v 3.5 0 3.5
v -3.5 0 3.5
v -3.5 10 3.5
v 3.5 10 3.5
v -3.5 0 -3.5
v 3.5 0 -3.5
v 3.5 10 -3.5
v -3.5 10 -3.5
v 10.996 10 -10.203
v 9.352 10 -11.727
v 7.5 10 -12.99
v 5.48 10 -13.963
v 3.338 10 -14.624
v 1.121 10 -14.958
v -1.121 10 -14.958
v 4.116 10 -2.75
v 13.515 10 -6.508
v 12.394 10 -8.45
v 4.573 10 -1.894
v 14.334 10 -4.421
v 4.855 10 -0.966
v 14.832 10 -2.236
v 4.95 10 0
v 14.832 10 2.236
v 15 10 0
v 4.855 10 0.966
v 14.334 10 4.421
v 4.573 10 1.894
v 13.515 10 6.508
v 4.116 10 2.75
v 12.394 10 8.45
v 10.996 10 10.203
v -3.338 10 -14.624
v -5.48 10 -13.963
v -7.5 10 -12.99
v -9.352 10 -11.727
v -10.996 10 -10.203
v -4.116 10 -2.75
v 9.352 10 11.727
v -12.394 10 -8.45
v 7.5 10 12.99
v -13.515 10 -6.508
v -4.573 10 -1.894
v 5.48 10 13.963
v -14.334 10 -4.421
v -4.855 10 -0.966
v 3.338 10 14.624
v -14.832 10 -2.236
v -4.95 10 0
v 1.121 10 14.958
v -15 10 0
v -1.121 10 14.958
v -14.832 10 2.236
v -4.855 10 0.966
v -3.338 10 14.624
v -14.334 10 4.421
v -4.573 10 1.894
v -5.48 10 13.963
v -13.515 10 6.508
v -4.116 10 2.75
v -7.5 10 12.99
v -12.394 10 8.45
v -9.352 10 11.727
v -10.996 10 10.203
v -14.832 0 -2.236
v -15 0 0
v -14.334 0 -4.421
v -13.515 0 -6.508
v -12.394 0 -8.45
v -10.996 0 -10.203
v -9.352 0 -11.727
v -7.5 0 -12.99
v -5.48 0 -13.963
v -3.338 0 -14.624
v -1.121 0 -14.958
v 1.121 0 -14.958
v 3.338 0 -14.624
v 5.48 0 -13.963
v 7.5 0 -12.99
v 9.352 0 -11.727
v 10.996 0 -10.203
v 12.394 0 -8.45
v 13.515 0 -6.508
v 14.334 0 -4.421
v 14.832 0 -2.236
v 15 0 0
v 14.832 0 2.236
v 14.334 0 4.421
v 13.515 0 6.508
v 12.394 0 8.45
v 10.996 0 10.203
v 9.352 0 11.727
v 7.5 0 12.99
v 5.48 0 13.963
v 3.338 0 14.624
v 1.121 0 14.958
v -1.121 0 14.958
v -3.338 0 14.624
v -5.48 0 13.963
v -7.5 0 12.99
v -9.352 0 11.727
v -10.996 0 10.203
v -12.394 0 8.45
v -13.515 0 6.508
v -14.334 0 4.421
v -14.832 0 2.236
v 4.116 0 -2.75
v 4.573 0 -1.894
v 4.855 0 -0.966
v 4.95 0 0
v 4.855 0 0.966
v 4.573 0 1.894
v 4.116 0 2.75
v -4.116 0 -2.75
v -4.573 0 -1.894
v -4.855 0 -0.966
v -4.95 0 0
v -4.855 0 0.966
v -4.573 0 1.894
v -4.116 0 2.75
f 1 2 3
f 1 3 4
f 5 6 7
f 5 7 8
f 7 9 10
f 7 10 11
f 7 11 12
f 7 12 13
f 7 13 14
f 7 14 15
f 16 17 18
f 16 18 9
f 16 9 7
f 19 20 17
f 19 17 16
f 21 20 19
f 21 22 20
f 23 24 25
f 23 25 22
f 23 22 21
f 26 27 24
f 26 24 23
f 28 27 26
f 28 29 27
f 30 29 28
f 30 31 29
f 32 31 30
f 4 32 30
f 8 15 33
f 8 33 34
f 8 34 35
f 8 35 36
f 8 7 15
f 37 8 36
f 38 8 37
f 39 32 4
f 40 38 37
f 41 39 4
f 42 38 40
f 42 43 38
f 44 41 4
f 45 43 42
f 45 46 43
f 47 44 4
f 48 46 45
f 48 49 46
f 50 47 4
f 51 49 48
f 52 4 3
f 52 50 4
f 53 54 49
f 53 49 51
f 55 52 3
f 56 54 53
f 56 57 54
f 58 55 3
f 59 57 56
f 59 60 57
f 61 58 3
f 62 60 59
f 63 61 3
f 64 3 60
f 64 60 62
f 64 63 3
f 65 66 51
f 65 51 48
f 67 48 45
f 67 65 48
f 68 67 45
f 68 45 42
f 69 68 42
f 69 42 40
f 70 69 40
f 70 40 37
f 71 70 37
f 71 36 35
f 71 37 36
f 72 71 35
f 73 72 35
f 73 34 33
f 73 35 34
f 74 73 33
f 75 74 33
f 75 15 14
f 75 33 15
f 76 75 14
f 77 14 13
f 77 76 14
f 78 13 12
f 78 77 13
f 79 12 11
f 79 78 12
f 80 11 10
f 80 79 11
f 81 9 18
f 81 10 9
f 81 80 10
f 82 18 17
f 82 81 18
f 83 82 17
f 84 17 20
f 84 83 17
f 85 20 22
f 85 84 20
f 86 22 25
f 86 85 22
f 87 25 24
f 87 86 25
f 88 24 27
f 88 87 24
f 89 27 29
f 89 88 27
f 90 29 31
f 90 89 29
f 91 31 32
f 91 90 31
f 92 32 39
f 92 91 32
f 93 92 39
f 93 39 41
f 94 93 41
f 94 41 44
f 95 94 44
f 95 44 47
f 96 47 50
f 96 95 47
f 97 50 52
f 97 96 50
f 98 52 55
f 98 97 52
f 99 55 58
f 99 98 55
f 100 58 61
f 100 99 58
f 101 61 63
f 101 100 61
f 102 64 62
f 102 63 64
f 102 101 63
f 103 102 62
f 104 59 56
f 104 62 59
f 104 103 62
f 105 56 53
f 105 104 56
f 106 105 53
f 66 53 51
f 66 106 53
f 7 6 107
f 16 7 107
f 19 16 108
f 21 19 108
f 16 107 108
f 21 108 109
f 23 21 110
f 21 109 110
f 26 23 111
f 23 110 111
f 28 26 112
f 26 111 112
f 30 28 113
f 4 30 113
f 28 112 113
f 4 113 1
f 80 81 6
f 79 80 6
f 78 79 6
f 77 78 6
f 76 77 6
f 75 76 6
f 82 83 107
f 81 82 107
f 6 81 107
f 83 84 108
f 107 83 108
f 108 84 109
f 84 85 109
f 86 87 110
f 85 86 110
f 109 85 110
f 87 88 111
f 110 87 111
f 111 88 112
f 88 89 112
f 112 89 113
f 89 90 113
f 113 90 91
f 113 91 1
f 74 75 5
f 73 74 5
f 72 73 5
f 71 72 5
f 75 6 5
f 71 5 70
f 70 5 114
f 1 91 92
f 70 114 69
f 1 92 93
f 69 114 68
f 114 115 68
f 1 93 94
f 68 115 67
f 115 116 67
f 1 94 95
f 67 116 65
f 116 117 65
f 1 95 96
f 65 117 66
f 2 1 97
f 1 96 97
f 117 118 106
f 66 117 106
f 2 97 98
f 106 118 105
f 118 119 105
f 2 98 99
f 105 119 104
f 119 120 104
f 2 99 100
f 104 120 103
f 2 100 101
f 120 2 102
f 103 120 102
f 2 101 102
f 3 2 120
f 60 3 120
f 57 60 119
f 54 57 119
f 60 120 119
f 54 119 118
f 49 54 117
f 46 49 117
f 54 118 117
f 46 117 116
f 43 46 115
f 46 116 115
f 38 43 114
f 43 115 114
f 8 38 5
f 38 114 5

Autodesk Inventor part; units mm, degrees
ref_plane "YZ Plane" through (0, 0, 0) normal (1, 0, 0) x (0, 1, 0)
ref_plane "XZ Plane" through (0, 0, 0) normal (0, 1, 0) x (-1, 0, 0)
ref_plane "XY Plane" through (0, 0, 0) normal (0, 0, 1) x (1, 0, 0)
sketch "Sketch1" plane through (0, 0, 0) normal (0, 1, 0) x (-1, 0, 0)
  circle A0 centre (0, 0) radius 15
  dimension "d0" = 30
extrude "Extrusion1" add sketch "Sketch1" along normal blind 10
sketch "Sketch2" plane through (0, 0, 0) normal (0, -1, 0) x (1, 0, 0)
  line L0 (-3.5, 3.5) -> (3.5, 3.5)
  line L1 (3.5, 3.5) -> (3.5, -3.5)
  line L2 (3.5, -3.5) -> (-3.5, -3.5)
  line L3 (-3.5, -3.5) -> (-3.5, 3.5)
  circle A0 centre (0, 0) radius 4.9497
  dimension "d3" = 7
  dimension "d4" = 7
  dimension "d5" = 3.5
  dimension "d6" = 3.5
extrude "Extrusion2" cut sketch "Sketch2" against normal blind 12.7 contours L0 L1 L2 L3 | L3 A0 | A0 L1
equation "\"d5\" = 0.5 * d4"
equation "\"d6\" = 0.5 * d3"
properties part number "generic-launcher-blank"
